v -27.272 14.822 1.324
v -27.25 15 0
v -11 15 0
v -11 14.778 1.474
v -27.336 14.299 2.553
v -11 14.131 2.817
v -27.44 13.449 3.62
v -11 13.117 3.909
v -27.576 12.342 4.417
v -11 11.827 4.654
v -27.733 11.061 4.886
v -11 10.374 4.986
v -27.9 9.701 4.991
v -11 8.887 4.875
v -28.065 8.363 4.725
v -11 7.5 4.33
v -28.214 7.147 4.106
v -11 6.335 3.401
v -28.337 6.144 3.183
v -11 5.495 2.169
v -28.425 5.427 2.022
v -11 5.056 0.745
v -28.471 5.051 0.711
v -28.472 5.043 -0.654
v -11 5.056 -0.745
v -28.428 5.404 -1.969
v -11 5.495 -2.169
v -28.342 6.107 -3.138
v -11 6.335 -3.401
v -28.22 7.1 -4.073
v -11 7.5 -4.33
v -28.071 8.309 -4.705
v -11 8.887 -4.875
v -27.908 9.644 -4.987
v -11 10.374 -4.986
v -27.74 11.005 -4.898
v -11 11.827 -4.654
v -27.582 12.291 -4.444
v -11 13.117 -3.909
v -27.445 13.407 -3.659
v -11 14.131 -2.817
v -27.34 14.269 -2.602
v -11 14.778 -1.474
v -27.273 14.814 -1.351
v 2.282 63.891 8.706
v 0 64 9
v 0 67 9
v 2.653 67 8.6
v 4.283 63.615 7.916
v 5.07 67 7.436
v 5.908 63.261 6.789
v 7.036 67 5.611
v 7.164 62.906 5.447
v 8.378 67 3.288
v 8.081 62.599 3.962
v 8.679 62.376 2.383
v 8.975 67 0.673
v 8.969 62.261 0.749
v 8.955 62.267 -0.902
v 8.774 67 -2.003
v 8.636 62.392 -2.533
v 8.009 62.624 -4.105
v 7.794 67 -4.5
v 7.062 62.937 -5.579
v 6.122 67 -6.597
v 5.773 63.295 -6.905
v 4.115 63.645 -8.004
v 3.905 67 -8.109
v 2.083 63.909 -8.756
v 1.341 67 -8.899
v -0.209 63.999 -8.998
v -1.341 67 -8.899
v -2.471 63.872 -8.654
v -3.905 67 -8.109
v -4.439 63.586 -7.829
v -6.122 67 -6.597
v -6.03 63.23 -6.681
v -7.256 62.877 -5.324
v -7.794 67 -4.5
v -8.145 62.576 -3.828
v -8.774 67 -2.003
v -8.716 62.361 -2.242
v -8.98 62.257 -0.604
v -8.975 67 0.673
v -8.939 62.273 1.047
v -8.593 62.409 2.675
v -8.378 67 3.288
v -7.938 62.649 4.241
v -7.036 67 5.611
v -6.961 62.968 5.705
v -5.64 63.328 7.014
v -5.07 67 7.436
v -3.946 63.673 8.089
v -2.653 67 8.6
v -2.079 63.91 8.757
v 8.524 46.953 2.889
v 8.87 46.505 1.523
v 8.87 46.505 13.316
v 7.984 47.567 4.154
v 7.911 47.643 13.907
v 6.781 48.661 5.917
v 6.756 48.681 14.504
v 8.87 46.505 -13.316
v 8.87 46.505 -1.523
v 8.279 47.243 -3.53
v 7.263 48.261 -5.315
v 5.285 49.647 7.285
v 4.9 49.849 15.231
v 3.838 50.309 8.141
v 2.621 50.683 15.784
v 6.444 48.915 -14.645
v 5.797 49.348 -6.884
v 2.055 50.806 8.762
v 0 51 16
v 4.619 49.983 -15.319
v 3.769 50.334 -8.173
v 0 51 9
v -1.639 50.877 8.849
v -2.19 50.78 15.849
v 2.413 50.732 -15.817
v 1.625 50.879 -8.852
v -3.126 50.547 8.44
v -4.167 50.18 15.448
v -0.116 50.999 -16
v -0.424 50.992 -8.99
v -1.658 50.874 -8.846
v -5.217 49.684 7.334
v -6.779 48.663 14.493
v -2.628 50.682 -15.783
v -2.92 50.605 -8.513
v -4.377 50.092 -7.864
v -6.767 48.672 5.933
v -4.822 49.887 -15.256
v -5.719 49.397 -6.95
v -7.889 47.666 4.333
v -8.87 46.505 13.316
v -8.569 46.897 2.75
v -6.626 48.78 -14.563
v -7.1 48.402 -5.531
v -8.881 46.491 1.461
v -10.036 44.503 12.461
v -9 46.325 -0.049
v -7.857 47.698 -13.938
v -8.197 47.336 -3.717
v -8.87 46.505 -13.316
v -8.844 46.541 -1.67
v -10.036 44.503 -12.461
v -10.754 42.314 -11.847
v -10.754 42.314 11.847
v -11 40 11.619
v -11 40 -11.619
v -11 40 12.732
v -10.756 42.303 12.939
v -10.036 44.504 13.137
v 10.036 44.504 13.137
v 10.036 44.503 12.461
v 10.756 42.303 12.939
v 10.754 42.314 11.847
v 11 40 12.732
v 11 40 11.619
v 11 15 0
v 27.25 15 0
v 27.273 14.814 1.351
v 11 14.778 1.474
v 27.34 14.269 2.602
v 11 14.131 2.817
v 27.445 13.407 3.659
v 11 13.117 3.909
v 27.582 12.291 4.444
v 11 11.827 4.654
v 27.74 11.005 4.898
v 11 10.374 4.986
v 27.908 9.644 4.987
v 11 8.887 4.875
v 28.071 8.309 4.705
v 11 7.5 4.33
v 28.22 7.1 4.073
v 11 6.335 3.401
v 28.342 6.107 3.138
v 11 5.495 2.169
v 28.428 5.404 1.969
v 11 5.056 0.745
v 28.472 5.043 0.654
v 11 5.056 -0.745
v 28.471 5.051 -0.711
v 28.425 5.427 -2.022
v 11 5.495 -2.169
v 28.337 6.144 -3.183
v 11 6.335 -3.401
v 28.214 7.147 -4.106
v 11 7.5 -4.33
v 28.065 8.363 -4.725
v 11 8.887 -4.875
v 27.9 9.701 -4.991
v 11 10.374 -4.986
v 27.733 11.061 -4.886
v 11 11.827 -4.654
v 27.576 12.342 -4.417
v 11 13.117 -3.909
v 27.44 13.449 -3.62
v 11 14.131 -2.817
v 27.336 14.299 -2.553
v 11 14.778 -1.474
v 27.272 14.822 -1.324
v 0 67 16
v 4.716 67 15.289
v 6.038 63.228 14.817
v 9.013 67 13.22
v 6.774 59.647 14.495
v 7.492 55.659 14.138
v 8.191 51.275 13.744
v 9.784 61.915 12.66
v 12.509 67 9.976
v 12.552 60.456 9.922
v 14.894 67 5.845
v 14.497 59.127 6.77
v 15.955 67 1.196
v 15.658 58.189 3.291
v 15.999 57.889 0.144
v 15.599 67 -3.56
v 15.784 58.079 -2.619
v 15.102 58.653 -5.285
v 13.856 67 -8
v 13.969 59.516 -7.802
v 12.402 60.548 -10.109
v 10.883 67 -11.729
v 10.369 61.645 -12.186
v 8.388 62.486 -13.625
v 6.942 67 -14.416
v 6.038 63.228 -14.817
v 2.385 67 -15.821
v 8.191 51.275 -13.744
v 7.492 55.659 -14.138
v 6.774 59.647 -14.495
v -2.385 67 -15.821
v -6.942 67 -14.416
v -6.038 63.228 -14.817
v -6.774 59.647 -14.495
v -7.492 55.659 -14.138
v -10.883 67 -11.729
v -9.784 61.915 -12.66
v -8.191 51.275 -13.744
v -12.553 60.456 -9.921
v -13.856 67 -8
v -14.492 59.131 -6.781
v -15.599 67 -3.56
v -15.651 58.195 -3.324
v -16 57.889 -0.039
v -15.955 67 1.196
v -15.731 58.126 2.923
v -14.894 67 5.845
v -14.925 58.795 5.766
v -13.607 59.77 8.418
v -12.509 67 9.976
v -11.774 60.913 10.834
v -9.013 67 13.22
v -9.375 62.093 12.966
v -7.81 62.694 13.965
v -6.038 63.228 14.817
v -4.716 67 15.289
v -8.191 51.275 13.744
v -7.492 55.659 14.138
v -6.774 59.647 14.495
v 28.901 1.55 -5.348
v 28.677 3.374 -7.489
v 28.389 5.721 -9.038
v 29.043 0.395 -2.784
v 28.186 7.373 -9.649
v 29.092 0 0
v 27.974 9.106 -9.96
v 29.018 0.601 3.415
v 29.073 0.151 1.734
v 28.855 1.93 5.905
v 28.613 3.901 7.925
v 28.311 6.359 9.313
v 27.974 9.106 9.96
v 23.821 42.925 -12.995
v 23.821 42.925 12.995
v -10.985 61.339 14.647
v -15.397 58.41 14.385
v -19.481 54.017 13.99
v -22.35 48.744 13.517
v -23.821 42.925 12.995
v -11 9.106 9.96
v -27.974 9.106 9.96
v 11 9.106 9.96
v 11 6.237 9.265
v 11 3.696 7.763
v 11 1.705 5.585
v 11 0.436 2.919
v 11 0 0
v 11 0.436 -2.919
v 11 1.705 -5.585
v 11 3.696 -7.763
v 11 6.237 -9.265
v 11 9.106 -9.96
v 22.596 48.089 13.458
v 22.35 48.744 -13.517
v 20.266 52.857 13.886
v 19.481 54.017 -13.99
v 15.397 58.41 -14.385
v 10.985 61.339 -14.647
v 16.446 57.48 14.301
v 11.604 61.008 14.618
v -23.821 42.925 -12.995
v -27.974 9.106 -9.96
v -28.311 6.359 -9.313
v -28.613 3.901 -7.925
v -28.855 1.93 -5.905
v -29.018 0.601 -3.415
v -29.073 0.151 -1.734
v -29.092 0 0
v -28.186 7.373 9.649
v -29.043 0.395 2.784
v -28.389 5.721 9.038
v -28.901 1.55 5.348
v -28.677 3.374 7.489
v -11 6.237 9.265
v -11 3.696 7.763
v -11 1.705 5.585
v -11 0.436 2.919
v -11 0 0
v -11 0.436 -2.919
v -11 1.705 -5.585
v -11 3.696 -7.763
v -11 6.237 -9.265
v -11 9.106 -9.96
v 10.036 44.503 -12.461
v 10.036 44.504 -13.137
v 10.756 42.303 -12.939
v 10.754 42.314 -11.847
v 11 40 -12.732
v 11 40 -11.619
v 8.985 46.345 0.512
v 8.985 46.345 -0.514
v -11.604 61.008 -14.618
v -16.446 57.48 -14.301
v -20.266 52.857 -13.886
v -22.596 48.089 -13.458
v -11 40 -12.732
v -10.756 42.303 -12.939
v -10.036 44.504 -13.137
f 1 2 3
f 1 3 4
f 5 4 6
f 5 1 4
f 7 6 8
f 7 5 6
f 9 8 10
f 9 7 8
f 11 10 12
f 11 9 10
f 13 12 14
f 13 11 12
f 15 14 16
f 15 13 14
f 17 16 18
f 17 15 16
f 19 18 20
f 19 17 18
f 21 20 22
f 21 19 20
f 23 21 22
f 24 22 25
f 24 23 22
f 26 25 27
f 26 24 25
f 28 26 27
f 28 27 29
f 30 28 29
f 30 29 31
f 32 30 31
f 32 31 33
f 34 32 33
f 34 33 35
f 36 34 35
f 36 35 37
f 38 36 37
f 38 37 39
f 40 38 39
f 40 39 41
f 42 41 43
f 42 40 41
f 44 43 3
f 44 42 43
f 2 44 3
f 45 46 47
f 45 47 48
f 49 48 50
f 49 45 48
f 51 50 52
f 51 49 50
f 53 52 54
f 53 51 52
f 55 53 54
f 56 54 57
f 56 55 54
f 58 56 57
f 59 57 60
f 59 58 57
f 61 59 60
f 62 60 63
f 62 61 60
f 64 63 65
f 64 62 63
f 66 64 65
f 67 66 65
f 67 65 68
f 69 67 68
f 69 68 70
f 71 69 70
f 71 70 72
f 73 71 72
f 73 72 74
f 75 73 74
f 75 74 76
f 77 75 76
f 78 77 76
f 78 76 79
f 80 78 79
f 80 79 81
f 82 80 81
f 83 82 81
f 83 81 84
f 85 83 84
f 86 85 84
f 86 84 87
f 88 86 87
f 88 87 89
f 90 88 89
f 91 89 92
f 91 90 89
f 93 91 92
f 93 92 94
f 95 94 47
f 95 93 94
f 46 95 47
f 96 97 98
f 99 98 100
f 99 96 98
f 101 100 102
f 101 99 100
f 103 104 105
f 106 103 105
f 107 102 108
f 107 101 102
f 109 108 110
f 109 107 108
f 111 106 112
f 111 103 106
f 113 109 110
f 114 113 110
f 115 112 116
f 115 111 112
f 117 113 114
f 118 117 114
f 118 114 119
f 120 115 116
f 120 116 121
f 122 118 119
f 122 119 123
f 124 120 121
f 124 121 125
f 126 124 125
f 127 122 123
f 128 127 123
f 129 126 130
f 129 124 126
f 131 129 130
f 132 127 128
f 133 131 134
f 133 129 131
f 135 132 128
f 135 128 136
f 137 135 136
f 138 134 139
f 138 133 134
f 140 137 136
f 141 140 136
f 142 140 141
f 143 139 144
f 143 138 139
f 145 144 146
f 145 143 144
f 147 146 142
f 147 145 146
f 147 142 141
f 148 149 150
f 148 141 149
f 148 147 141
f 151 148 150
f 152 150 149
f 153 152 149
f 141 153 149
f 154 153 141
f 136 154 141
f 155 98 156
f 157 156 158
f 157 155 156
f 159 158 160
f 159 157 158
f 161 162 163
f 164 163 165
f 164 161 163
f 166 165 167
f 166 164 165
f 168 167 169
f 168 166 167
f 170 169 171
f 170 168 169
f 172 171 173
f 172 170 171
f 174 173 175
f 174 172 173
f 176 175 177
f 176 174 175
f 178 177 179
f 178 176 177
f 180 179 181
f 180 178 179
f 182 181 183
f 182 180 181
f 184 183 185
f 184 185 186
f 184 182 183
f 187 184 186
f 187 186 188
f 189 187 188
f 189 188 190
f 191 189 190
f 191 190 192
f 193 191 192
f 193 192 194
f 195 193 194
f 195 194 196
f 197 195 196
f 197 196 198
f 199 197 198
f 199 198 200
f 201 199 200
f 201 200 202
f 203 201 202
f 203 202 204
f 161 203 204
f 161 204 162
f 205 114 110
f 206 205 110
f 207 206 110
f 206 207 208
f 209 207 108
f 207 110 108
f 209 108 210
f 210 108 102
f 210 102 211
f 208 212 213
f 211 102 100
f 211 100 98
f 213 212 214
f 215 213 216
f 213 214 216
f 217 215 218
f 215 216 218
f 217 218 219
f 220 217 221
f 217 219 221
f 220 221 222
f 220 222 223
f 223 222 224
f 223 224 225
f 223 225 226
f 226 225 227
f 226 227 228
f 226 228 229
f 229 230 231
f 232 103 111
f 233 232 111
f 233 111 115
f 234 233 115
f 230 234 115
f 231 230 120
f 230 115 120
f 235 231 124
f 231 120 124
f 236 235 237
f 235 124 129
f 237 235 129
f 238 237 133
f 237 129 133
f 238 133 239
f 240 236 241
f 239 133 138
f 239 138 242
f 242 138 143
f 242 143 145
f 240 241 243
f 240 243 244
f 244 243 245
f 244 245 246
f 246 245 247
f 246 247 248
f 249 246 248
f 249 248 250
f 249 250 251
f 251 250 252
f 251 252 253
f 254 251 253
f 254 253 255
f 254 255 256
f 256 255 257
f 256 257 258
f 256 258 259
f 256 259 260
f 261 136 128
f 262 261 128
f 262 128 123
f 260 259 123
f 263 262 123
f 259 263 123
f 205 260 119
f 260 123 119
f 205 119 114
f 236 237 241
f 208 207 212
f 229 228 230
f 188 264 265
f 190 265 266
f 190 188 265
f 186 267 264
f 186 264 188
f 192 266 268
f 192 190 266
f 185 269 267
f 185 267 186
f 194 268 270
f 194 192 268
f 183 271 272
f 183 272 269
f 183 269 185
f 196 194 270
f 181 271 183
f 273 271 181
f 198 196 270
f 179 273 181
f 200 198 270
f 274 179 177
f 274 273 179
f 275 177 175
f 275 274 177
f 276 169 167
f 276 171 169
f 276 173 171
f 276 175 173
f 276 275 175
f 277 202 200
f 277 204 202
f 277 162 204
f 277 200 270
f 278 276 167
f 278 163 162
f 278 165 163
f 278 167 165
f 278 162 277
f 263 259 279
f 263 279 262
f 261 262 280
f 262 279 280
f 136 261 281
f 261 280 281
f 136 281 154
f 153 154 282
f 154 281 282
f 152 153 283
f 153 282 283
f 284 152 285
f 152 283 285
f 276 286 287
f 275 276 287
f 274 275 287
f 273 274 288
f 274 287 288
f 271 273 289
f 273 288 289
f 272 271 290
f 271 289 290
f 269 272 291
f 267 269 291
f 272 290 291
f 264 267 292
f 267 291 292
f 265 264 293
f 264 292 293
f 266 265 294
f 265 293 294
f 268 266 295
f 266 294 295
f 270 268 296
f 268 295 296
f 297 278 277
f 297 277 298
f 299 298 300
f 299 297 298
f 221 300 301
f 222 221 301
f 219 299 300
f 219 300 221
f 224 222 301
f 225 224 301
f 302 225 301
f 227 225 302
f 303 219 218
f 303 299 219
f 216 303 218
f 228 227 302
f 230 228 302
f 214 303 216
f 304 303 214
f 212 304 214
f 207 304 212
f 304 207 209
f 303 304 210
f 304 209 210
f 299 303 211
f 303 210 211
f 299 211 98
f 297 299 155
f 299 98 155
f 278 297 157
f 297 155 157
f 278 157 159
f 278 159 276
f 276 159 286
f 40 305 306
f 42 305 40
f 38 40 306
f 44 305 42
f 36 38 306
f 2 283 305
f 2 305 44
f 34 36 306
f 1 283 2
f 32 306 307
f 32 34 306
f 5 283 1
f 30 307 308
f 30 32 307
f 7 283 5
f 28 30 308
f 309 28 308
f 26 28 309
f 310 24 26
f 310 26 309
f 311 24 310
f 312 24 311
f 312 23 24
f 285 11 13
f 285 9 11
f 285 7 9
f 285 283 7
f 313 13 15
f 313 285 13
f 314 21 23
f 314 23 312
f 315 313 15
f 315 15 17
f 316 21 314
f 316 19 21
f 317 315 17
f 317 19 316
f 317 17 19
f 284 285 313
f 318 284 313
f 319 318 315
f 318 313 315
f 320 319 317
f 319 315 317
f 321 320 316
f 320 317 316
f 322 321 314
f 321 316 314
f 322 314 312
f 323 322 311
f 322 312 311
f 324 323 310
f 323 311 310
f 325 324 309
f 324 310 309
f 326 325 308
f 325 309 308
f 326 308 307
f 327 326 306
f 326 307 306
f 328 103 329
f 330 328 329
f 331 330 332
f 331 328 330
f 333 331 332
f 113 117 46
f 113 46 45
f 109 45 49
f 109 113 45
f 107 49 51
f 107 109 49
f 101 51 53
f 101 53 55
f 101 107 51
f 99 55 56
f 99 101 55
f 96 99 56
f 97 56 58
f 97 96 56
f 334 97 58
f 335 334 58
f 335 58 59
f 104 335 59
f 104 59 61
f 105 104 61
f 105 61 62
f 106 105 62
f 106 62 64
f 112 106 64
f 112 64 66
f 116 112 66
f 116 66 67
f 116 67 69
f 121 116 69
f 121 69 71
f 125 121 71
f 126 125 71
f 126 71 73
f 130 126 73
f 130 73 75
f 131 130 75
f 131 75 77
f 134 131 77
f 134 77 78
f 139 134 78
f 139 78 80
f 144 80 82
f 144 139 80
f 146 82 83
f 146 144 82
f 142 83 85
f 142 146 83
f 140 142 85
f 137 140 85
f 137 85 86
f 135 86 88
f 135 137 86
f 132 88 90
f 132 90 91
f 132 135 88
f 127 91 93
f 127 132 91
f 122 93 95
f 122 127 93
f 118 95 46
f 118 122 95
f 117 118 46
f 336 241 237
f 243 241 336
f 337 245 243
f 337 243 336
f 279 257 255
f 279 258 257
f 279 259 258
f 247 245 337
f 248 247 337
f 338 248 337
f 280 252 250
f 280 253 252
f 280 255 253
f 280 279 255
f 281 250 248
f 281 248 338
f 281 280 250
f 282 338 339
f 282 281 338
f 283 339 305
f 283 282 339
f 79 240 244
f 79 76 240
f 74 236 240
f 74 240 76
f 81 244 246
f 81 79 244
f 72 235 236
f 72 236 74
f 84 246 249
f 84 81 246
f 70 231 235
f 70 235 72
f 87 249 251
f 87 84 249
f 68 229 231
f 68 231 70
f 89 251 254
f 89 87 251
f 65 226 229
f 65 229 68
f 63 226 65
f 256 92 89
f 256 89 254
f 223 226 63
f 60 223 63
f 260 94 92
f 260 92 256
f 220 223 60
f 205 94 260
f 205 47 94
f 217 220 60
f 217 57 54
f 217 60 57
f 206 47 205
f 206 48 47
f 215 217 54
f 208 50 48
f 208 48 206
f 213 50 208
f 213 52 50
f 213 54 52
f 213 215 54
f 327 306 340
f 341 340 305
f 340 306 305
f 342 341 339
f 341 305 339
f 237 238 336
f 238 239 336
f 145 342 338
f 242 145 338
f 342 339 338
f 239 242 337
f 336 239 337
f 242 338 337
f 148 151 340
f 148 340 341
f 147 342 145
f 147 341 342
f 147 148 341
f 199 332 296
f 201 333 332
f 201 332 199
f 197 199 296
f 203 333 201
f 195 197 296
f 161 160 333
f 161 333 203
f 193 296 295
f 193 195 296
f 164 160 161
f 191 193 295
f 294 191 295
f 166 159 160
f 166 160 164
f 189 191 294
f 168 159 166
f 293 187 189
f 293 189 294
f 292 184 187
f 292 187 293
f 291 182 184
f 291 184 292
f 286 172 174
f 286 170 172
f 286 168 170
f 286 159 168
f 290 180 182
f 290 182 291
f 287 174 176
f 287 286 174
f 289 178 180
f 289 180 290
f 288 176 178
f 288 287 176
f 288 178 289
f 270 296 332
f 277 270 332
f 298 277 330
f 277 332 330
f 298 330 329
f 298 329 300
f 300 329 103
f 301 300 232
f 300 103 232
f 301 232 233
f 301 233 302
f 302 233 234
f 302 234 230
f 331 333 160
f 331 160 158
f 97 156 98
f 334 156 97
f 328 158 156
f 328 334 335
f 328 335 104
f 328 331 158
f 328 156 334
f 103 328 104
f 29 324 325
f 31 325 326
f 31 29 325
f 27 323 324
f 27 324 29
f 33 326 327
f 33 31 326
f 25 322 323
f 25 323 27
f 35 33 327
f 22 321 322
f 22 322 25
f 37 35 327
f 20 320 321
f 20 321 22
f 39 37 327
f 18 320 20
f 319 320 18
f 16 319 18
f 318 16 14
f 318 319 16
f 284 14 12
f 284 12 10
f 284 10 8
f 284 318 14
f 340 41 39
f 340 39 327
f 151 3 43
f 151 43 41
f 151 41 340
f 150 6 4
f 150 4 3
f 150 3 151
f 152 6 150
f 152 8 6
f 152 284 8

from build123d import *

# Parameters (mm, degrees)
BOSS_EXTRUDE2_DEPTH     = 20
CUT_EXTRUDE5_DEPTH      = 74.091191345
CUT_EXTRUDE5_DEPTH_BACK = 74.091191345
SKETCH3_OUTSIDE_W       = 61.06
SKETCH3_OUTSIDE_H       = 85.06
SKETCH3_OUTSIDE_R       = 5
BOSS_EXTRUDE3_START     = 40
SKETCH4_R               = 16
SKETCH4_R_2             = 9
BOSS_EXTRUDE3_DEPTH     = 27
SKETCH4_4_R             = 9
CUT_EXTRUDE7_DEPTH      = 70
CUT_EXTRUDE8_DEPTH      = 75.775144726
CUT_EXTRUDE8_DEPTH_BACK = 75.775144726


with BuildPart() as part:
    # Sketch1 → Boss-Extrude2 (new, symmetric)
    with BuildSketch(Plane.XY):
        with BuildLine():
            ThreePointArc((-11, 40), (0, 51), (11, 40))
            Line((11, 40), (11, 18.669270992))
            ThreePointArc((11, 18.669270992), (20.493901532, 27.510004003), (24, 40))
            ThreePointArc((24, 40), (23.955235162, 41.465164949), (23.821107639, 42.924864242))
            ThreePointArc((23.821107639, 42.924864242), (0, 64), (-23.821107639, 42.924864242))
            ThreePointArc((-23.821107639, 42.924864242), (-21.218172289, 28.784423121), (-11, 18.669270992))
            Line((-11, 18.669270992), (-11, 40))
        make_face()
        with BuildLine():
            ThreePointArc((24, 40), (20.493901532, 27.510004003), (11, 18.669270992))
            Line((11, 18.669270992), (11, 0))
            Line((11, 0), (29.091618247, 0))
            Line((29.091618247, 0), (23.821107639, 42.924864242))
            ThreePointArc((23.821107639, 42.924864242), (23.955235162, 41.465164949), (24, 40))
        make_face()
        with BuildLine():
            Line((-11, 0), (-11, 18.669270992))
            ThreePointArc((-11, 18.669270992), (-21.218172289, 28.784423121), (-23.821107639, 42.924864242))
            Line((-23.821107639, 42.924864242), (-29.091618247, 0))
            Line((-29.091618247, 0), (-11, 0))
        make_face()
    extrude(amount=BOSS_EXTRUDE2_DEPTH, both=True)

    # Sketch3 outside → Cut-Extrude5 (cut, two sides: drawn at the far end of the back side and taken through both)
    # profile 1 of 2: a face of its own
    with BuildSketch(Plane(origin=(0, 0, 0), x_dir=(0, 0, -1), z_dir=(1, 0, 0)).offset(-CUT_EXTRUDE5_DEPTH_BACK)):
        with Locations((0, 32)):
            Rectangle(SKETCH3_OUTSIDE_W, SKETCH3_OUTSIDE_H)
        with BuildLine():
            Line((-14.886153969, 64), (-9.959975113, 9.106190314))
            ThreePointArc((-9.959975113, 9.106190314), (0, 0), (9.959975113, 9.106190314))
            Line((9.959975113, 9.106190314), (14.886153969, 64))
            Line((14.886153969, 64), (-14.886153969, 64))
        make_face(mode=Mode.SUBTRACT)
    # profile 2 of 2: a face of its own
    with BuildSketch(Plane(origin=(0, 0, 0), x_dir=(0, 0, -1), z_dir=(1, 0, 0)).offset(-CUT_EXTRUDE5_DEPTH_BACK)):
        with Locations(Location((0, 10, 0), (0, 0, 90))):
            Circle(SKETCH3_OUTSIDE_R)
    extrude(amount=CUT_EXTRUDE5_DEPTH + CUT_EXTRUDE5_DEPTH_BACK, mode=Mode.SUBTRACT)

    # Sketch4 → Boss-Extrude3 (add)
    with BuildSketch(Plane(origin=(0, 0, 0), x_dir=(1, 0, 0), z_dir=(0, 1, 0)).offset(BOSS_EXTRUDE3_START)):
        with Locations(Location((0, 0, 0), (0, 0, 270))):
            Circle(SKETCH4_R)
        with Locations(Location((0, 0, 0), (0, 0, 270))):
            Circle(SKETCH4_R_2, mode=Mode.SUBTRACT)
    extrude(amount=BOSS_EXTRUDE3_DEPTH)

    # Sketch4<4> → Cut-Extrude7 (cut)
    with BuildSketch(Plane(origin=(0, 0, 0), x_dir=(1, 0, 0), z_dir=(0, 1, 0))):
        with Locations(Location((0, 0, 0), (0, 0, 270))):
            Circle(SKETCH4_4_R)
    extrude(amount=CUT_EXTRUDE7_DEPTH, mode=Mode.SUBTRACT)

    # Sketch5 → Cut-Extrude8 (cut, two sides: drawn at the far end of the back side and taken through both)
    with BuildSketch(Plane.XY.offset(-CUT_EXTRUDE8_DEPTH_BACK)):
        with BuildLine():
            Line((-11, 40), (11, 40))
            ThreePointArc((11, 40), (10.4539787, 43.422620245), (8.870121938, 46.505454388))
            ThreePointArc((8.870121938, 46.505454388), (-3.422620245, 50.4539787), (-11, 40))
        make_face()
    extrude(amount=CUT_EXTRUDE8_DEPTH + CUT_EXTRUDE8_DEPTH_BACK, mode=Mode.SUBTRACT)


solid = part.part
